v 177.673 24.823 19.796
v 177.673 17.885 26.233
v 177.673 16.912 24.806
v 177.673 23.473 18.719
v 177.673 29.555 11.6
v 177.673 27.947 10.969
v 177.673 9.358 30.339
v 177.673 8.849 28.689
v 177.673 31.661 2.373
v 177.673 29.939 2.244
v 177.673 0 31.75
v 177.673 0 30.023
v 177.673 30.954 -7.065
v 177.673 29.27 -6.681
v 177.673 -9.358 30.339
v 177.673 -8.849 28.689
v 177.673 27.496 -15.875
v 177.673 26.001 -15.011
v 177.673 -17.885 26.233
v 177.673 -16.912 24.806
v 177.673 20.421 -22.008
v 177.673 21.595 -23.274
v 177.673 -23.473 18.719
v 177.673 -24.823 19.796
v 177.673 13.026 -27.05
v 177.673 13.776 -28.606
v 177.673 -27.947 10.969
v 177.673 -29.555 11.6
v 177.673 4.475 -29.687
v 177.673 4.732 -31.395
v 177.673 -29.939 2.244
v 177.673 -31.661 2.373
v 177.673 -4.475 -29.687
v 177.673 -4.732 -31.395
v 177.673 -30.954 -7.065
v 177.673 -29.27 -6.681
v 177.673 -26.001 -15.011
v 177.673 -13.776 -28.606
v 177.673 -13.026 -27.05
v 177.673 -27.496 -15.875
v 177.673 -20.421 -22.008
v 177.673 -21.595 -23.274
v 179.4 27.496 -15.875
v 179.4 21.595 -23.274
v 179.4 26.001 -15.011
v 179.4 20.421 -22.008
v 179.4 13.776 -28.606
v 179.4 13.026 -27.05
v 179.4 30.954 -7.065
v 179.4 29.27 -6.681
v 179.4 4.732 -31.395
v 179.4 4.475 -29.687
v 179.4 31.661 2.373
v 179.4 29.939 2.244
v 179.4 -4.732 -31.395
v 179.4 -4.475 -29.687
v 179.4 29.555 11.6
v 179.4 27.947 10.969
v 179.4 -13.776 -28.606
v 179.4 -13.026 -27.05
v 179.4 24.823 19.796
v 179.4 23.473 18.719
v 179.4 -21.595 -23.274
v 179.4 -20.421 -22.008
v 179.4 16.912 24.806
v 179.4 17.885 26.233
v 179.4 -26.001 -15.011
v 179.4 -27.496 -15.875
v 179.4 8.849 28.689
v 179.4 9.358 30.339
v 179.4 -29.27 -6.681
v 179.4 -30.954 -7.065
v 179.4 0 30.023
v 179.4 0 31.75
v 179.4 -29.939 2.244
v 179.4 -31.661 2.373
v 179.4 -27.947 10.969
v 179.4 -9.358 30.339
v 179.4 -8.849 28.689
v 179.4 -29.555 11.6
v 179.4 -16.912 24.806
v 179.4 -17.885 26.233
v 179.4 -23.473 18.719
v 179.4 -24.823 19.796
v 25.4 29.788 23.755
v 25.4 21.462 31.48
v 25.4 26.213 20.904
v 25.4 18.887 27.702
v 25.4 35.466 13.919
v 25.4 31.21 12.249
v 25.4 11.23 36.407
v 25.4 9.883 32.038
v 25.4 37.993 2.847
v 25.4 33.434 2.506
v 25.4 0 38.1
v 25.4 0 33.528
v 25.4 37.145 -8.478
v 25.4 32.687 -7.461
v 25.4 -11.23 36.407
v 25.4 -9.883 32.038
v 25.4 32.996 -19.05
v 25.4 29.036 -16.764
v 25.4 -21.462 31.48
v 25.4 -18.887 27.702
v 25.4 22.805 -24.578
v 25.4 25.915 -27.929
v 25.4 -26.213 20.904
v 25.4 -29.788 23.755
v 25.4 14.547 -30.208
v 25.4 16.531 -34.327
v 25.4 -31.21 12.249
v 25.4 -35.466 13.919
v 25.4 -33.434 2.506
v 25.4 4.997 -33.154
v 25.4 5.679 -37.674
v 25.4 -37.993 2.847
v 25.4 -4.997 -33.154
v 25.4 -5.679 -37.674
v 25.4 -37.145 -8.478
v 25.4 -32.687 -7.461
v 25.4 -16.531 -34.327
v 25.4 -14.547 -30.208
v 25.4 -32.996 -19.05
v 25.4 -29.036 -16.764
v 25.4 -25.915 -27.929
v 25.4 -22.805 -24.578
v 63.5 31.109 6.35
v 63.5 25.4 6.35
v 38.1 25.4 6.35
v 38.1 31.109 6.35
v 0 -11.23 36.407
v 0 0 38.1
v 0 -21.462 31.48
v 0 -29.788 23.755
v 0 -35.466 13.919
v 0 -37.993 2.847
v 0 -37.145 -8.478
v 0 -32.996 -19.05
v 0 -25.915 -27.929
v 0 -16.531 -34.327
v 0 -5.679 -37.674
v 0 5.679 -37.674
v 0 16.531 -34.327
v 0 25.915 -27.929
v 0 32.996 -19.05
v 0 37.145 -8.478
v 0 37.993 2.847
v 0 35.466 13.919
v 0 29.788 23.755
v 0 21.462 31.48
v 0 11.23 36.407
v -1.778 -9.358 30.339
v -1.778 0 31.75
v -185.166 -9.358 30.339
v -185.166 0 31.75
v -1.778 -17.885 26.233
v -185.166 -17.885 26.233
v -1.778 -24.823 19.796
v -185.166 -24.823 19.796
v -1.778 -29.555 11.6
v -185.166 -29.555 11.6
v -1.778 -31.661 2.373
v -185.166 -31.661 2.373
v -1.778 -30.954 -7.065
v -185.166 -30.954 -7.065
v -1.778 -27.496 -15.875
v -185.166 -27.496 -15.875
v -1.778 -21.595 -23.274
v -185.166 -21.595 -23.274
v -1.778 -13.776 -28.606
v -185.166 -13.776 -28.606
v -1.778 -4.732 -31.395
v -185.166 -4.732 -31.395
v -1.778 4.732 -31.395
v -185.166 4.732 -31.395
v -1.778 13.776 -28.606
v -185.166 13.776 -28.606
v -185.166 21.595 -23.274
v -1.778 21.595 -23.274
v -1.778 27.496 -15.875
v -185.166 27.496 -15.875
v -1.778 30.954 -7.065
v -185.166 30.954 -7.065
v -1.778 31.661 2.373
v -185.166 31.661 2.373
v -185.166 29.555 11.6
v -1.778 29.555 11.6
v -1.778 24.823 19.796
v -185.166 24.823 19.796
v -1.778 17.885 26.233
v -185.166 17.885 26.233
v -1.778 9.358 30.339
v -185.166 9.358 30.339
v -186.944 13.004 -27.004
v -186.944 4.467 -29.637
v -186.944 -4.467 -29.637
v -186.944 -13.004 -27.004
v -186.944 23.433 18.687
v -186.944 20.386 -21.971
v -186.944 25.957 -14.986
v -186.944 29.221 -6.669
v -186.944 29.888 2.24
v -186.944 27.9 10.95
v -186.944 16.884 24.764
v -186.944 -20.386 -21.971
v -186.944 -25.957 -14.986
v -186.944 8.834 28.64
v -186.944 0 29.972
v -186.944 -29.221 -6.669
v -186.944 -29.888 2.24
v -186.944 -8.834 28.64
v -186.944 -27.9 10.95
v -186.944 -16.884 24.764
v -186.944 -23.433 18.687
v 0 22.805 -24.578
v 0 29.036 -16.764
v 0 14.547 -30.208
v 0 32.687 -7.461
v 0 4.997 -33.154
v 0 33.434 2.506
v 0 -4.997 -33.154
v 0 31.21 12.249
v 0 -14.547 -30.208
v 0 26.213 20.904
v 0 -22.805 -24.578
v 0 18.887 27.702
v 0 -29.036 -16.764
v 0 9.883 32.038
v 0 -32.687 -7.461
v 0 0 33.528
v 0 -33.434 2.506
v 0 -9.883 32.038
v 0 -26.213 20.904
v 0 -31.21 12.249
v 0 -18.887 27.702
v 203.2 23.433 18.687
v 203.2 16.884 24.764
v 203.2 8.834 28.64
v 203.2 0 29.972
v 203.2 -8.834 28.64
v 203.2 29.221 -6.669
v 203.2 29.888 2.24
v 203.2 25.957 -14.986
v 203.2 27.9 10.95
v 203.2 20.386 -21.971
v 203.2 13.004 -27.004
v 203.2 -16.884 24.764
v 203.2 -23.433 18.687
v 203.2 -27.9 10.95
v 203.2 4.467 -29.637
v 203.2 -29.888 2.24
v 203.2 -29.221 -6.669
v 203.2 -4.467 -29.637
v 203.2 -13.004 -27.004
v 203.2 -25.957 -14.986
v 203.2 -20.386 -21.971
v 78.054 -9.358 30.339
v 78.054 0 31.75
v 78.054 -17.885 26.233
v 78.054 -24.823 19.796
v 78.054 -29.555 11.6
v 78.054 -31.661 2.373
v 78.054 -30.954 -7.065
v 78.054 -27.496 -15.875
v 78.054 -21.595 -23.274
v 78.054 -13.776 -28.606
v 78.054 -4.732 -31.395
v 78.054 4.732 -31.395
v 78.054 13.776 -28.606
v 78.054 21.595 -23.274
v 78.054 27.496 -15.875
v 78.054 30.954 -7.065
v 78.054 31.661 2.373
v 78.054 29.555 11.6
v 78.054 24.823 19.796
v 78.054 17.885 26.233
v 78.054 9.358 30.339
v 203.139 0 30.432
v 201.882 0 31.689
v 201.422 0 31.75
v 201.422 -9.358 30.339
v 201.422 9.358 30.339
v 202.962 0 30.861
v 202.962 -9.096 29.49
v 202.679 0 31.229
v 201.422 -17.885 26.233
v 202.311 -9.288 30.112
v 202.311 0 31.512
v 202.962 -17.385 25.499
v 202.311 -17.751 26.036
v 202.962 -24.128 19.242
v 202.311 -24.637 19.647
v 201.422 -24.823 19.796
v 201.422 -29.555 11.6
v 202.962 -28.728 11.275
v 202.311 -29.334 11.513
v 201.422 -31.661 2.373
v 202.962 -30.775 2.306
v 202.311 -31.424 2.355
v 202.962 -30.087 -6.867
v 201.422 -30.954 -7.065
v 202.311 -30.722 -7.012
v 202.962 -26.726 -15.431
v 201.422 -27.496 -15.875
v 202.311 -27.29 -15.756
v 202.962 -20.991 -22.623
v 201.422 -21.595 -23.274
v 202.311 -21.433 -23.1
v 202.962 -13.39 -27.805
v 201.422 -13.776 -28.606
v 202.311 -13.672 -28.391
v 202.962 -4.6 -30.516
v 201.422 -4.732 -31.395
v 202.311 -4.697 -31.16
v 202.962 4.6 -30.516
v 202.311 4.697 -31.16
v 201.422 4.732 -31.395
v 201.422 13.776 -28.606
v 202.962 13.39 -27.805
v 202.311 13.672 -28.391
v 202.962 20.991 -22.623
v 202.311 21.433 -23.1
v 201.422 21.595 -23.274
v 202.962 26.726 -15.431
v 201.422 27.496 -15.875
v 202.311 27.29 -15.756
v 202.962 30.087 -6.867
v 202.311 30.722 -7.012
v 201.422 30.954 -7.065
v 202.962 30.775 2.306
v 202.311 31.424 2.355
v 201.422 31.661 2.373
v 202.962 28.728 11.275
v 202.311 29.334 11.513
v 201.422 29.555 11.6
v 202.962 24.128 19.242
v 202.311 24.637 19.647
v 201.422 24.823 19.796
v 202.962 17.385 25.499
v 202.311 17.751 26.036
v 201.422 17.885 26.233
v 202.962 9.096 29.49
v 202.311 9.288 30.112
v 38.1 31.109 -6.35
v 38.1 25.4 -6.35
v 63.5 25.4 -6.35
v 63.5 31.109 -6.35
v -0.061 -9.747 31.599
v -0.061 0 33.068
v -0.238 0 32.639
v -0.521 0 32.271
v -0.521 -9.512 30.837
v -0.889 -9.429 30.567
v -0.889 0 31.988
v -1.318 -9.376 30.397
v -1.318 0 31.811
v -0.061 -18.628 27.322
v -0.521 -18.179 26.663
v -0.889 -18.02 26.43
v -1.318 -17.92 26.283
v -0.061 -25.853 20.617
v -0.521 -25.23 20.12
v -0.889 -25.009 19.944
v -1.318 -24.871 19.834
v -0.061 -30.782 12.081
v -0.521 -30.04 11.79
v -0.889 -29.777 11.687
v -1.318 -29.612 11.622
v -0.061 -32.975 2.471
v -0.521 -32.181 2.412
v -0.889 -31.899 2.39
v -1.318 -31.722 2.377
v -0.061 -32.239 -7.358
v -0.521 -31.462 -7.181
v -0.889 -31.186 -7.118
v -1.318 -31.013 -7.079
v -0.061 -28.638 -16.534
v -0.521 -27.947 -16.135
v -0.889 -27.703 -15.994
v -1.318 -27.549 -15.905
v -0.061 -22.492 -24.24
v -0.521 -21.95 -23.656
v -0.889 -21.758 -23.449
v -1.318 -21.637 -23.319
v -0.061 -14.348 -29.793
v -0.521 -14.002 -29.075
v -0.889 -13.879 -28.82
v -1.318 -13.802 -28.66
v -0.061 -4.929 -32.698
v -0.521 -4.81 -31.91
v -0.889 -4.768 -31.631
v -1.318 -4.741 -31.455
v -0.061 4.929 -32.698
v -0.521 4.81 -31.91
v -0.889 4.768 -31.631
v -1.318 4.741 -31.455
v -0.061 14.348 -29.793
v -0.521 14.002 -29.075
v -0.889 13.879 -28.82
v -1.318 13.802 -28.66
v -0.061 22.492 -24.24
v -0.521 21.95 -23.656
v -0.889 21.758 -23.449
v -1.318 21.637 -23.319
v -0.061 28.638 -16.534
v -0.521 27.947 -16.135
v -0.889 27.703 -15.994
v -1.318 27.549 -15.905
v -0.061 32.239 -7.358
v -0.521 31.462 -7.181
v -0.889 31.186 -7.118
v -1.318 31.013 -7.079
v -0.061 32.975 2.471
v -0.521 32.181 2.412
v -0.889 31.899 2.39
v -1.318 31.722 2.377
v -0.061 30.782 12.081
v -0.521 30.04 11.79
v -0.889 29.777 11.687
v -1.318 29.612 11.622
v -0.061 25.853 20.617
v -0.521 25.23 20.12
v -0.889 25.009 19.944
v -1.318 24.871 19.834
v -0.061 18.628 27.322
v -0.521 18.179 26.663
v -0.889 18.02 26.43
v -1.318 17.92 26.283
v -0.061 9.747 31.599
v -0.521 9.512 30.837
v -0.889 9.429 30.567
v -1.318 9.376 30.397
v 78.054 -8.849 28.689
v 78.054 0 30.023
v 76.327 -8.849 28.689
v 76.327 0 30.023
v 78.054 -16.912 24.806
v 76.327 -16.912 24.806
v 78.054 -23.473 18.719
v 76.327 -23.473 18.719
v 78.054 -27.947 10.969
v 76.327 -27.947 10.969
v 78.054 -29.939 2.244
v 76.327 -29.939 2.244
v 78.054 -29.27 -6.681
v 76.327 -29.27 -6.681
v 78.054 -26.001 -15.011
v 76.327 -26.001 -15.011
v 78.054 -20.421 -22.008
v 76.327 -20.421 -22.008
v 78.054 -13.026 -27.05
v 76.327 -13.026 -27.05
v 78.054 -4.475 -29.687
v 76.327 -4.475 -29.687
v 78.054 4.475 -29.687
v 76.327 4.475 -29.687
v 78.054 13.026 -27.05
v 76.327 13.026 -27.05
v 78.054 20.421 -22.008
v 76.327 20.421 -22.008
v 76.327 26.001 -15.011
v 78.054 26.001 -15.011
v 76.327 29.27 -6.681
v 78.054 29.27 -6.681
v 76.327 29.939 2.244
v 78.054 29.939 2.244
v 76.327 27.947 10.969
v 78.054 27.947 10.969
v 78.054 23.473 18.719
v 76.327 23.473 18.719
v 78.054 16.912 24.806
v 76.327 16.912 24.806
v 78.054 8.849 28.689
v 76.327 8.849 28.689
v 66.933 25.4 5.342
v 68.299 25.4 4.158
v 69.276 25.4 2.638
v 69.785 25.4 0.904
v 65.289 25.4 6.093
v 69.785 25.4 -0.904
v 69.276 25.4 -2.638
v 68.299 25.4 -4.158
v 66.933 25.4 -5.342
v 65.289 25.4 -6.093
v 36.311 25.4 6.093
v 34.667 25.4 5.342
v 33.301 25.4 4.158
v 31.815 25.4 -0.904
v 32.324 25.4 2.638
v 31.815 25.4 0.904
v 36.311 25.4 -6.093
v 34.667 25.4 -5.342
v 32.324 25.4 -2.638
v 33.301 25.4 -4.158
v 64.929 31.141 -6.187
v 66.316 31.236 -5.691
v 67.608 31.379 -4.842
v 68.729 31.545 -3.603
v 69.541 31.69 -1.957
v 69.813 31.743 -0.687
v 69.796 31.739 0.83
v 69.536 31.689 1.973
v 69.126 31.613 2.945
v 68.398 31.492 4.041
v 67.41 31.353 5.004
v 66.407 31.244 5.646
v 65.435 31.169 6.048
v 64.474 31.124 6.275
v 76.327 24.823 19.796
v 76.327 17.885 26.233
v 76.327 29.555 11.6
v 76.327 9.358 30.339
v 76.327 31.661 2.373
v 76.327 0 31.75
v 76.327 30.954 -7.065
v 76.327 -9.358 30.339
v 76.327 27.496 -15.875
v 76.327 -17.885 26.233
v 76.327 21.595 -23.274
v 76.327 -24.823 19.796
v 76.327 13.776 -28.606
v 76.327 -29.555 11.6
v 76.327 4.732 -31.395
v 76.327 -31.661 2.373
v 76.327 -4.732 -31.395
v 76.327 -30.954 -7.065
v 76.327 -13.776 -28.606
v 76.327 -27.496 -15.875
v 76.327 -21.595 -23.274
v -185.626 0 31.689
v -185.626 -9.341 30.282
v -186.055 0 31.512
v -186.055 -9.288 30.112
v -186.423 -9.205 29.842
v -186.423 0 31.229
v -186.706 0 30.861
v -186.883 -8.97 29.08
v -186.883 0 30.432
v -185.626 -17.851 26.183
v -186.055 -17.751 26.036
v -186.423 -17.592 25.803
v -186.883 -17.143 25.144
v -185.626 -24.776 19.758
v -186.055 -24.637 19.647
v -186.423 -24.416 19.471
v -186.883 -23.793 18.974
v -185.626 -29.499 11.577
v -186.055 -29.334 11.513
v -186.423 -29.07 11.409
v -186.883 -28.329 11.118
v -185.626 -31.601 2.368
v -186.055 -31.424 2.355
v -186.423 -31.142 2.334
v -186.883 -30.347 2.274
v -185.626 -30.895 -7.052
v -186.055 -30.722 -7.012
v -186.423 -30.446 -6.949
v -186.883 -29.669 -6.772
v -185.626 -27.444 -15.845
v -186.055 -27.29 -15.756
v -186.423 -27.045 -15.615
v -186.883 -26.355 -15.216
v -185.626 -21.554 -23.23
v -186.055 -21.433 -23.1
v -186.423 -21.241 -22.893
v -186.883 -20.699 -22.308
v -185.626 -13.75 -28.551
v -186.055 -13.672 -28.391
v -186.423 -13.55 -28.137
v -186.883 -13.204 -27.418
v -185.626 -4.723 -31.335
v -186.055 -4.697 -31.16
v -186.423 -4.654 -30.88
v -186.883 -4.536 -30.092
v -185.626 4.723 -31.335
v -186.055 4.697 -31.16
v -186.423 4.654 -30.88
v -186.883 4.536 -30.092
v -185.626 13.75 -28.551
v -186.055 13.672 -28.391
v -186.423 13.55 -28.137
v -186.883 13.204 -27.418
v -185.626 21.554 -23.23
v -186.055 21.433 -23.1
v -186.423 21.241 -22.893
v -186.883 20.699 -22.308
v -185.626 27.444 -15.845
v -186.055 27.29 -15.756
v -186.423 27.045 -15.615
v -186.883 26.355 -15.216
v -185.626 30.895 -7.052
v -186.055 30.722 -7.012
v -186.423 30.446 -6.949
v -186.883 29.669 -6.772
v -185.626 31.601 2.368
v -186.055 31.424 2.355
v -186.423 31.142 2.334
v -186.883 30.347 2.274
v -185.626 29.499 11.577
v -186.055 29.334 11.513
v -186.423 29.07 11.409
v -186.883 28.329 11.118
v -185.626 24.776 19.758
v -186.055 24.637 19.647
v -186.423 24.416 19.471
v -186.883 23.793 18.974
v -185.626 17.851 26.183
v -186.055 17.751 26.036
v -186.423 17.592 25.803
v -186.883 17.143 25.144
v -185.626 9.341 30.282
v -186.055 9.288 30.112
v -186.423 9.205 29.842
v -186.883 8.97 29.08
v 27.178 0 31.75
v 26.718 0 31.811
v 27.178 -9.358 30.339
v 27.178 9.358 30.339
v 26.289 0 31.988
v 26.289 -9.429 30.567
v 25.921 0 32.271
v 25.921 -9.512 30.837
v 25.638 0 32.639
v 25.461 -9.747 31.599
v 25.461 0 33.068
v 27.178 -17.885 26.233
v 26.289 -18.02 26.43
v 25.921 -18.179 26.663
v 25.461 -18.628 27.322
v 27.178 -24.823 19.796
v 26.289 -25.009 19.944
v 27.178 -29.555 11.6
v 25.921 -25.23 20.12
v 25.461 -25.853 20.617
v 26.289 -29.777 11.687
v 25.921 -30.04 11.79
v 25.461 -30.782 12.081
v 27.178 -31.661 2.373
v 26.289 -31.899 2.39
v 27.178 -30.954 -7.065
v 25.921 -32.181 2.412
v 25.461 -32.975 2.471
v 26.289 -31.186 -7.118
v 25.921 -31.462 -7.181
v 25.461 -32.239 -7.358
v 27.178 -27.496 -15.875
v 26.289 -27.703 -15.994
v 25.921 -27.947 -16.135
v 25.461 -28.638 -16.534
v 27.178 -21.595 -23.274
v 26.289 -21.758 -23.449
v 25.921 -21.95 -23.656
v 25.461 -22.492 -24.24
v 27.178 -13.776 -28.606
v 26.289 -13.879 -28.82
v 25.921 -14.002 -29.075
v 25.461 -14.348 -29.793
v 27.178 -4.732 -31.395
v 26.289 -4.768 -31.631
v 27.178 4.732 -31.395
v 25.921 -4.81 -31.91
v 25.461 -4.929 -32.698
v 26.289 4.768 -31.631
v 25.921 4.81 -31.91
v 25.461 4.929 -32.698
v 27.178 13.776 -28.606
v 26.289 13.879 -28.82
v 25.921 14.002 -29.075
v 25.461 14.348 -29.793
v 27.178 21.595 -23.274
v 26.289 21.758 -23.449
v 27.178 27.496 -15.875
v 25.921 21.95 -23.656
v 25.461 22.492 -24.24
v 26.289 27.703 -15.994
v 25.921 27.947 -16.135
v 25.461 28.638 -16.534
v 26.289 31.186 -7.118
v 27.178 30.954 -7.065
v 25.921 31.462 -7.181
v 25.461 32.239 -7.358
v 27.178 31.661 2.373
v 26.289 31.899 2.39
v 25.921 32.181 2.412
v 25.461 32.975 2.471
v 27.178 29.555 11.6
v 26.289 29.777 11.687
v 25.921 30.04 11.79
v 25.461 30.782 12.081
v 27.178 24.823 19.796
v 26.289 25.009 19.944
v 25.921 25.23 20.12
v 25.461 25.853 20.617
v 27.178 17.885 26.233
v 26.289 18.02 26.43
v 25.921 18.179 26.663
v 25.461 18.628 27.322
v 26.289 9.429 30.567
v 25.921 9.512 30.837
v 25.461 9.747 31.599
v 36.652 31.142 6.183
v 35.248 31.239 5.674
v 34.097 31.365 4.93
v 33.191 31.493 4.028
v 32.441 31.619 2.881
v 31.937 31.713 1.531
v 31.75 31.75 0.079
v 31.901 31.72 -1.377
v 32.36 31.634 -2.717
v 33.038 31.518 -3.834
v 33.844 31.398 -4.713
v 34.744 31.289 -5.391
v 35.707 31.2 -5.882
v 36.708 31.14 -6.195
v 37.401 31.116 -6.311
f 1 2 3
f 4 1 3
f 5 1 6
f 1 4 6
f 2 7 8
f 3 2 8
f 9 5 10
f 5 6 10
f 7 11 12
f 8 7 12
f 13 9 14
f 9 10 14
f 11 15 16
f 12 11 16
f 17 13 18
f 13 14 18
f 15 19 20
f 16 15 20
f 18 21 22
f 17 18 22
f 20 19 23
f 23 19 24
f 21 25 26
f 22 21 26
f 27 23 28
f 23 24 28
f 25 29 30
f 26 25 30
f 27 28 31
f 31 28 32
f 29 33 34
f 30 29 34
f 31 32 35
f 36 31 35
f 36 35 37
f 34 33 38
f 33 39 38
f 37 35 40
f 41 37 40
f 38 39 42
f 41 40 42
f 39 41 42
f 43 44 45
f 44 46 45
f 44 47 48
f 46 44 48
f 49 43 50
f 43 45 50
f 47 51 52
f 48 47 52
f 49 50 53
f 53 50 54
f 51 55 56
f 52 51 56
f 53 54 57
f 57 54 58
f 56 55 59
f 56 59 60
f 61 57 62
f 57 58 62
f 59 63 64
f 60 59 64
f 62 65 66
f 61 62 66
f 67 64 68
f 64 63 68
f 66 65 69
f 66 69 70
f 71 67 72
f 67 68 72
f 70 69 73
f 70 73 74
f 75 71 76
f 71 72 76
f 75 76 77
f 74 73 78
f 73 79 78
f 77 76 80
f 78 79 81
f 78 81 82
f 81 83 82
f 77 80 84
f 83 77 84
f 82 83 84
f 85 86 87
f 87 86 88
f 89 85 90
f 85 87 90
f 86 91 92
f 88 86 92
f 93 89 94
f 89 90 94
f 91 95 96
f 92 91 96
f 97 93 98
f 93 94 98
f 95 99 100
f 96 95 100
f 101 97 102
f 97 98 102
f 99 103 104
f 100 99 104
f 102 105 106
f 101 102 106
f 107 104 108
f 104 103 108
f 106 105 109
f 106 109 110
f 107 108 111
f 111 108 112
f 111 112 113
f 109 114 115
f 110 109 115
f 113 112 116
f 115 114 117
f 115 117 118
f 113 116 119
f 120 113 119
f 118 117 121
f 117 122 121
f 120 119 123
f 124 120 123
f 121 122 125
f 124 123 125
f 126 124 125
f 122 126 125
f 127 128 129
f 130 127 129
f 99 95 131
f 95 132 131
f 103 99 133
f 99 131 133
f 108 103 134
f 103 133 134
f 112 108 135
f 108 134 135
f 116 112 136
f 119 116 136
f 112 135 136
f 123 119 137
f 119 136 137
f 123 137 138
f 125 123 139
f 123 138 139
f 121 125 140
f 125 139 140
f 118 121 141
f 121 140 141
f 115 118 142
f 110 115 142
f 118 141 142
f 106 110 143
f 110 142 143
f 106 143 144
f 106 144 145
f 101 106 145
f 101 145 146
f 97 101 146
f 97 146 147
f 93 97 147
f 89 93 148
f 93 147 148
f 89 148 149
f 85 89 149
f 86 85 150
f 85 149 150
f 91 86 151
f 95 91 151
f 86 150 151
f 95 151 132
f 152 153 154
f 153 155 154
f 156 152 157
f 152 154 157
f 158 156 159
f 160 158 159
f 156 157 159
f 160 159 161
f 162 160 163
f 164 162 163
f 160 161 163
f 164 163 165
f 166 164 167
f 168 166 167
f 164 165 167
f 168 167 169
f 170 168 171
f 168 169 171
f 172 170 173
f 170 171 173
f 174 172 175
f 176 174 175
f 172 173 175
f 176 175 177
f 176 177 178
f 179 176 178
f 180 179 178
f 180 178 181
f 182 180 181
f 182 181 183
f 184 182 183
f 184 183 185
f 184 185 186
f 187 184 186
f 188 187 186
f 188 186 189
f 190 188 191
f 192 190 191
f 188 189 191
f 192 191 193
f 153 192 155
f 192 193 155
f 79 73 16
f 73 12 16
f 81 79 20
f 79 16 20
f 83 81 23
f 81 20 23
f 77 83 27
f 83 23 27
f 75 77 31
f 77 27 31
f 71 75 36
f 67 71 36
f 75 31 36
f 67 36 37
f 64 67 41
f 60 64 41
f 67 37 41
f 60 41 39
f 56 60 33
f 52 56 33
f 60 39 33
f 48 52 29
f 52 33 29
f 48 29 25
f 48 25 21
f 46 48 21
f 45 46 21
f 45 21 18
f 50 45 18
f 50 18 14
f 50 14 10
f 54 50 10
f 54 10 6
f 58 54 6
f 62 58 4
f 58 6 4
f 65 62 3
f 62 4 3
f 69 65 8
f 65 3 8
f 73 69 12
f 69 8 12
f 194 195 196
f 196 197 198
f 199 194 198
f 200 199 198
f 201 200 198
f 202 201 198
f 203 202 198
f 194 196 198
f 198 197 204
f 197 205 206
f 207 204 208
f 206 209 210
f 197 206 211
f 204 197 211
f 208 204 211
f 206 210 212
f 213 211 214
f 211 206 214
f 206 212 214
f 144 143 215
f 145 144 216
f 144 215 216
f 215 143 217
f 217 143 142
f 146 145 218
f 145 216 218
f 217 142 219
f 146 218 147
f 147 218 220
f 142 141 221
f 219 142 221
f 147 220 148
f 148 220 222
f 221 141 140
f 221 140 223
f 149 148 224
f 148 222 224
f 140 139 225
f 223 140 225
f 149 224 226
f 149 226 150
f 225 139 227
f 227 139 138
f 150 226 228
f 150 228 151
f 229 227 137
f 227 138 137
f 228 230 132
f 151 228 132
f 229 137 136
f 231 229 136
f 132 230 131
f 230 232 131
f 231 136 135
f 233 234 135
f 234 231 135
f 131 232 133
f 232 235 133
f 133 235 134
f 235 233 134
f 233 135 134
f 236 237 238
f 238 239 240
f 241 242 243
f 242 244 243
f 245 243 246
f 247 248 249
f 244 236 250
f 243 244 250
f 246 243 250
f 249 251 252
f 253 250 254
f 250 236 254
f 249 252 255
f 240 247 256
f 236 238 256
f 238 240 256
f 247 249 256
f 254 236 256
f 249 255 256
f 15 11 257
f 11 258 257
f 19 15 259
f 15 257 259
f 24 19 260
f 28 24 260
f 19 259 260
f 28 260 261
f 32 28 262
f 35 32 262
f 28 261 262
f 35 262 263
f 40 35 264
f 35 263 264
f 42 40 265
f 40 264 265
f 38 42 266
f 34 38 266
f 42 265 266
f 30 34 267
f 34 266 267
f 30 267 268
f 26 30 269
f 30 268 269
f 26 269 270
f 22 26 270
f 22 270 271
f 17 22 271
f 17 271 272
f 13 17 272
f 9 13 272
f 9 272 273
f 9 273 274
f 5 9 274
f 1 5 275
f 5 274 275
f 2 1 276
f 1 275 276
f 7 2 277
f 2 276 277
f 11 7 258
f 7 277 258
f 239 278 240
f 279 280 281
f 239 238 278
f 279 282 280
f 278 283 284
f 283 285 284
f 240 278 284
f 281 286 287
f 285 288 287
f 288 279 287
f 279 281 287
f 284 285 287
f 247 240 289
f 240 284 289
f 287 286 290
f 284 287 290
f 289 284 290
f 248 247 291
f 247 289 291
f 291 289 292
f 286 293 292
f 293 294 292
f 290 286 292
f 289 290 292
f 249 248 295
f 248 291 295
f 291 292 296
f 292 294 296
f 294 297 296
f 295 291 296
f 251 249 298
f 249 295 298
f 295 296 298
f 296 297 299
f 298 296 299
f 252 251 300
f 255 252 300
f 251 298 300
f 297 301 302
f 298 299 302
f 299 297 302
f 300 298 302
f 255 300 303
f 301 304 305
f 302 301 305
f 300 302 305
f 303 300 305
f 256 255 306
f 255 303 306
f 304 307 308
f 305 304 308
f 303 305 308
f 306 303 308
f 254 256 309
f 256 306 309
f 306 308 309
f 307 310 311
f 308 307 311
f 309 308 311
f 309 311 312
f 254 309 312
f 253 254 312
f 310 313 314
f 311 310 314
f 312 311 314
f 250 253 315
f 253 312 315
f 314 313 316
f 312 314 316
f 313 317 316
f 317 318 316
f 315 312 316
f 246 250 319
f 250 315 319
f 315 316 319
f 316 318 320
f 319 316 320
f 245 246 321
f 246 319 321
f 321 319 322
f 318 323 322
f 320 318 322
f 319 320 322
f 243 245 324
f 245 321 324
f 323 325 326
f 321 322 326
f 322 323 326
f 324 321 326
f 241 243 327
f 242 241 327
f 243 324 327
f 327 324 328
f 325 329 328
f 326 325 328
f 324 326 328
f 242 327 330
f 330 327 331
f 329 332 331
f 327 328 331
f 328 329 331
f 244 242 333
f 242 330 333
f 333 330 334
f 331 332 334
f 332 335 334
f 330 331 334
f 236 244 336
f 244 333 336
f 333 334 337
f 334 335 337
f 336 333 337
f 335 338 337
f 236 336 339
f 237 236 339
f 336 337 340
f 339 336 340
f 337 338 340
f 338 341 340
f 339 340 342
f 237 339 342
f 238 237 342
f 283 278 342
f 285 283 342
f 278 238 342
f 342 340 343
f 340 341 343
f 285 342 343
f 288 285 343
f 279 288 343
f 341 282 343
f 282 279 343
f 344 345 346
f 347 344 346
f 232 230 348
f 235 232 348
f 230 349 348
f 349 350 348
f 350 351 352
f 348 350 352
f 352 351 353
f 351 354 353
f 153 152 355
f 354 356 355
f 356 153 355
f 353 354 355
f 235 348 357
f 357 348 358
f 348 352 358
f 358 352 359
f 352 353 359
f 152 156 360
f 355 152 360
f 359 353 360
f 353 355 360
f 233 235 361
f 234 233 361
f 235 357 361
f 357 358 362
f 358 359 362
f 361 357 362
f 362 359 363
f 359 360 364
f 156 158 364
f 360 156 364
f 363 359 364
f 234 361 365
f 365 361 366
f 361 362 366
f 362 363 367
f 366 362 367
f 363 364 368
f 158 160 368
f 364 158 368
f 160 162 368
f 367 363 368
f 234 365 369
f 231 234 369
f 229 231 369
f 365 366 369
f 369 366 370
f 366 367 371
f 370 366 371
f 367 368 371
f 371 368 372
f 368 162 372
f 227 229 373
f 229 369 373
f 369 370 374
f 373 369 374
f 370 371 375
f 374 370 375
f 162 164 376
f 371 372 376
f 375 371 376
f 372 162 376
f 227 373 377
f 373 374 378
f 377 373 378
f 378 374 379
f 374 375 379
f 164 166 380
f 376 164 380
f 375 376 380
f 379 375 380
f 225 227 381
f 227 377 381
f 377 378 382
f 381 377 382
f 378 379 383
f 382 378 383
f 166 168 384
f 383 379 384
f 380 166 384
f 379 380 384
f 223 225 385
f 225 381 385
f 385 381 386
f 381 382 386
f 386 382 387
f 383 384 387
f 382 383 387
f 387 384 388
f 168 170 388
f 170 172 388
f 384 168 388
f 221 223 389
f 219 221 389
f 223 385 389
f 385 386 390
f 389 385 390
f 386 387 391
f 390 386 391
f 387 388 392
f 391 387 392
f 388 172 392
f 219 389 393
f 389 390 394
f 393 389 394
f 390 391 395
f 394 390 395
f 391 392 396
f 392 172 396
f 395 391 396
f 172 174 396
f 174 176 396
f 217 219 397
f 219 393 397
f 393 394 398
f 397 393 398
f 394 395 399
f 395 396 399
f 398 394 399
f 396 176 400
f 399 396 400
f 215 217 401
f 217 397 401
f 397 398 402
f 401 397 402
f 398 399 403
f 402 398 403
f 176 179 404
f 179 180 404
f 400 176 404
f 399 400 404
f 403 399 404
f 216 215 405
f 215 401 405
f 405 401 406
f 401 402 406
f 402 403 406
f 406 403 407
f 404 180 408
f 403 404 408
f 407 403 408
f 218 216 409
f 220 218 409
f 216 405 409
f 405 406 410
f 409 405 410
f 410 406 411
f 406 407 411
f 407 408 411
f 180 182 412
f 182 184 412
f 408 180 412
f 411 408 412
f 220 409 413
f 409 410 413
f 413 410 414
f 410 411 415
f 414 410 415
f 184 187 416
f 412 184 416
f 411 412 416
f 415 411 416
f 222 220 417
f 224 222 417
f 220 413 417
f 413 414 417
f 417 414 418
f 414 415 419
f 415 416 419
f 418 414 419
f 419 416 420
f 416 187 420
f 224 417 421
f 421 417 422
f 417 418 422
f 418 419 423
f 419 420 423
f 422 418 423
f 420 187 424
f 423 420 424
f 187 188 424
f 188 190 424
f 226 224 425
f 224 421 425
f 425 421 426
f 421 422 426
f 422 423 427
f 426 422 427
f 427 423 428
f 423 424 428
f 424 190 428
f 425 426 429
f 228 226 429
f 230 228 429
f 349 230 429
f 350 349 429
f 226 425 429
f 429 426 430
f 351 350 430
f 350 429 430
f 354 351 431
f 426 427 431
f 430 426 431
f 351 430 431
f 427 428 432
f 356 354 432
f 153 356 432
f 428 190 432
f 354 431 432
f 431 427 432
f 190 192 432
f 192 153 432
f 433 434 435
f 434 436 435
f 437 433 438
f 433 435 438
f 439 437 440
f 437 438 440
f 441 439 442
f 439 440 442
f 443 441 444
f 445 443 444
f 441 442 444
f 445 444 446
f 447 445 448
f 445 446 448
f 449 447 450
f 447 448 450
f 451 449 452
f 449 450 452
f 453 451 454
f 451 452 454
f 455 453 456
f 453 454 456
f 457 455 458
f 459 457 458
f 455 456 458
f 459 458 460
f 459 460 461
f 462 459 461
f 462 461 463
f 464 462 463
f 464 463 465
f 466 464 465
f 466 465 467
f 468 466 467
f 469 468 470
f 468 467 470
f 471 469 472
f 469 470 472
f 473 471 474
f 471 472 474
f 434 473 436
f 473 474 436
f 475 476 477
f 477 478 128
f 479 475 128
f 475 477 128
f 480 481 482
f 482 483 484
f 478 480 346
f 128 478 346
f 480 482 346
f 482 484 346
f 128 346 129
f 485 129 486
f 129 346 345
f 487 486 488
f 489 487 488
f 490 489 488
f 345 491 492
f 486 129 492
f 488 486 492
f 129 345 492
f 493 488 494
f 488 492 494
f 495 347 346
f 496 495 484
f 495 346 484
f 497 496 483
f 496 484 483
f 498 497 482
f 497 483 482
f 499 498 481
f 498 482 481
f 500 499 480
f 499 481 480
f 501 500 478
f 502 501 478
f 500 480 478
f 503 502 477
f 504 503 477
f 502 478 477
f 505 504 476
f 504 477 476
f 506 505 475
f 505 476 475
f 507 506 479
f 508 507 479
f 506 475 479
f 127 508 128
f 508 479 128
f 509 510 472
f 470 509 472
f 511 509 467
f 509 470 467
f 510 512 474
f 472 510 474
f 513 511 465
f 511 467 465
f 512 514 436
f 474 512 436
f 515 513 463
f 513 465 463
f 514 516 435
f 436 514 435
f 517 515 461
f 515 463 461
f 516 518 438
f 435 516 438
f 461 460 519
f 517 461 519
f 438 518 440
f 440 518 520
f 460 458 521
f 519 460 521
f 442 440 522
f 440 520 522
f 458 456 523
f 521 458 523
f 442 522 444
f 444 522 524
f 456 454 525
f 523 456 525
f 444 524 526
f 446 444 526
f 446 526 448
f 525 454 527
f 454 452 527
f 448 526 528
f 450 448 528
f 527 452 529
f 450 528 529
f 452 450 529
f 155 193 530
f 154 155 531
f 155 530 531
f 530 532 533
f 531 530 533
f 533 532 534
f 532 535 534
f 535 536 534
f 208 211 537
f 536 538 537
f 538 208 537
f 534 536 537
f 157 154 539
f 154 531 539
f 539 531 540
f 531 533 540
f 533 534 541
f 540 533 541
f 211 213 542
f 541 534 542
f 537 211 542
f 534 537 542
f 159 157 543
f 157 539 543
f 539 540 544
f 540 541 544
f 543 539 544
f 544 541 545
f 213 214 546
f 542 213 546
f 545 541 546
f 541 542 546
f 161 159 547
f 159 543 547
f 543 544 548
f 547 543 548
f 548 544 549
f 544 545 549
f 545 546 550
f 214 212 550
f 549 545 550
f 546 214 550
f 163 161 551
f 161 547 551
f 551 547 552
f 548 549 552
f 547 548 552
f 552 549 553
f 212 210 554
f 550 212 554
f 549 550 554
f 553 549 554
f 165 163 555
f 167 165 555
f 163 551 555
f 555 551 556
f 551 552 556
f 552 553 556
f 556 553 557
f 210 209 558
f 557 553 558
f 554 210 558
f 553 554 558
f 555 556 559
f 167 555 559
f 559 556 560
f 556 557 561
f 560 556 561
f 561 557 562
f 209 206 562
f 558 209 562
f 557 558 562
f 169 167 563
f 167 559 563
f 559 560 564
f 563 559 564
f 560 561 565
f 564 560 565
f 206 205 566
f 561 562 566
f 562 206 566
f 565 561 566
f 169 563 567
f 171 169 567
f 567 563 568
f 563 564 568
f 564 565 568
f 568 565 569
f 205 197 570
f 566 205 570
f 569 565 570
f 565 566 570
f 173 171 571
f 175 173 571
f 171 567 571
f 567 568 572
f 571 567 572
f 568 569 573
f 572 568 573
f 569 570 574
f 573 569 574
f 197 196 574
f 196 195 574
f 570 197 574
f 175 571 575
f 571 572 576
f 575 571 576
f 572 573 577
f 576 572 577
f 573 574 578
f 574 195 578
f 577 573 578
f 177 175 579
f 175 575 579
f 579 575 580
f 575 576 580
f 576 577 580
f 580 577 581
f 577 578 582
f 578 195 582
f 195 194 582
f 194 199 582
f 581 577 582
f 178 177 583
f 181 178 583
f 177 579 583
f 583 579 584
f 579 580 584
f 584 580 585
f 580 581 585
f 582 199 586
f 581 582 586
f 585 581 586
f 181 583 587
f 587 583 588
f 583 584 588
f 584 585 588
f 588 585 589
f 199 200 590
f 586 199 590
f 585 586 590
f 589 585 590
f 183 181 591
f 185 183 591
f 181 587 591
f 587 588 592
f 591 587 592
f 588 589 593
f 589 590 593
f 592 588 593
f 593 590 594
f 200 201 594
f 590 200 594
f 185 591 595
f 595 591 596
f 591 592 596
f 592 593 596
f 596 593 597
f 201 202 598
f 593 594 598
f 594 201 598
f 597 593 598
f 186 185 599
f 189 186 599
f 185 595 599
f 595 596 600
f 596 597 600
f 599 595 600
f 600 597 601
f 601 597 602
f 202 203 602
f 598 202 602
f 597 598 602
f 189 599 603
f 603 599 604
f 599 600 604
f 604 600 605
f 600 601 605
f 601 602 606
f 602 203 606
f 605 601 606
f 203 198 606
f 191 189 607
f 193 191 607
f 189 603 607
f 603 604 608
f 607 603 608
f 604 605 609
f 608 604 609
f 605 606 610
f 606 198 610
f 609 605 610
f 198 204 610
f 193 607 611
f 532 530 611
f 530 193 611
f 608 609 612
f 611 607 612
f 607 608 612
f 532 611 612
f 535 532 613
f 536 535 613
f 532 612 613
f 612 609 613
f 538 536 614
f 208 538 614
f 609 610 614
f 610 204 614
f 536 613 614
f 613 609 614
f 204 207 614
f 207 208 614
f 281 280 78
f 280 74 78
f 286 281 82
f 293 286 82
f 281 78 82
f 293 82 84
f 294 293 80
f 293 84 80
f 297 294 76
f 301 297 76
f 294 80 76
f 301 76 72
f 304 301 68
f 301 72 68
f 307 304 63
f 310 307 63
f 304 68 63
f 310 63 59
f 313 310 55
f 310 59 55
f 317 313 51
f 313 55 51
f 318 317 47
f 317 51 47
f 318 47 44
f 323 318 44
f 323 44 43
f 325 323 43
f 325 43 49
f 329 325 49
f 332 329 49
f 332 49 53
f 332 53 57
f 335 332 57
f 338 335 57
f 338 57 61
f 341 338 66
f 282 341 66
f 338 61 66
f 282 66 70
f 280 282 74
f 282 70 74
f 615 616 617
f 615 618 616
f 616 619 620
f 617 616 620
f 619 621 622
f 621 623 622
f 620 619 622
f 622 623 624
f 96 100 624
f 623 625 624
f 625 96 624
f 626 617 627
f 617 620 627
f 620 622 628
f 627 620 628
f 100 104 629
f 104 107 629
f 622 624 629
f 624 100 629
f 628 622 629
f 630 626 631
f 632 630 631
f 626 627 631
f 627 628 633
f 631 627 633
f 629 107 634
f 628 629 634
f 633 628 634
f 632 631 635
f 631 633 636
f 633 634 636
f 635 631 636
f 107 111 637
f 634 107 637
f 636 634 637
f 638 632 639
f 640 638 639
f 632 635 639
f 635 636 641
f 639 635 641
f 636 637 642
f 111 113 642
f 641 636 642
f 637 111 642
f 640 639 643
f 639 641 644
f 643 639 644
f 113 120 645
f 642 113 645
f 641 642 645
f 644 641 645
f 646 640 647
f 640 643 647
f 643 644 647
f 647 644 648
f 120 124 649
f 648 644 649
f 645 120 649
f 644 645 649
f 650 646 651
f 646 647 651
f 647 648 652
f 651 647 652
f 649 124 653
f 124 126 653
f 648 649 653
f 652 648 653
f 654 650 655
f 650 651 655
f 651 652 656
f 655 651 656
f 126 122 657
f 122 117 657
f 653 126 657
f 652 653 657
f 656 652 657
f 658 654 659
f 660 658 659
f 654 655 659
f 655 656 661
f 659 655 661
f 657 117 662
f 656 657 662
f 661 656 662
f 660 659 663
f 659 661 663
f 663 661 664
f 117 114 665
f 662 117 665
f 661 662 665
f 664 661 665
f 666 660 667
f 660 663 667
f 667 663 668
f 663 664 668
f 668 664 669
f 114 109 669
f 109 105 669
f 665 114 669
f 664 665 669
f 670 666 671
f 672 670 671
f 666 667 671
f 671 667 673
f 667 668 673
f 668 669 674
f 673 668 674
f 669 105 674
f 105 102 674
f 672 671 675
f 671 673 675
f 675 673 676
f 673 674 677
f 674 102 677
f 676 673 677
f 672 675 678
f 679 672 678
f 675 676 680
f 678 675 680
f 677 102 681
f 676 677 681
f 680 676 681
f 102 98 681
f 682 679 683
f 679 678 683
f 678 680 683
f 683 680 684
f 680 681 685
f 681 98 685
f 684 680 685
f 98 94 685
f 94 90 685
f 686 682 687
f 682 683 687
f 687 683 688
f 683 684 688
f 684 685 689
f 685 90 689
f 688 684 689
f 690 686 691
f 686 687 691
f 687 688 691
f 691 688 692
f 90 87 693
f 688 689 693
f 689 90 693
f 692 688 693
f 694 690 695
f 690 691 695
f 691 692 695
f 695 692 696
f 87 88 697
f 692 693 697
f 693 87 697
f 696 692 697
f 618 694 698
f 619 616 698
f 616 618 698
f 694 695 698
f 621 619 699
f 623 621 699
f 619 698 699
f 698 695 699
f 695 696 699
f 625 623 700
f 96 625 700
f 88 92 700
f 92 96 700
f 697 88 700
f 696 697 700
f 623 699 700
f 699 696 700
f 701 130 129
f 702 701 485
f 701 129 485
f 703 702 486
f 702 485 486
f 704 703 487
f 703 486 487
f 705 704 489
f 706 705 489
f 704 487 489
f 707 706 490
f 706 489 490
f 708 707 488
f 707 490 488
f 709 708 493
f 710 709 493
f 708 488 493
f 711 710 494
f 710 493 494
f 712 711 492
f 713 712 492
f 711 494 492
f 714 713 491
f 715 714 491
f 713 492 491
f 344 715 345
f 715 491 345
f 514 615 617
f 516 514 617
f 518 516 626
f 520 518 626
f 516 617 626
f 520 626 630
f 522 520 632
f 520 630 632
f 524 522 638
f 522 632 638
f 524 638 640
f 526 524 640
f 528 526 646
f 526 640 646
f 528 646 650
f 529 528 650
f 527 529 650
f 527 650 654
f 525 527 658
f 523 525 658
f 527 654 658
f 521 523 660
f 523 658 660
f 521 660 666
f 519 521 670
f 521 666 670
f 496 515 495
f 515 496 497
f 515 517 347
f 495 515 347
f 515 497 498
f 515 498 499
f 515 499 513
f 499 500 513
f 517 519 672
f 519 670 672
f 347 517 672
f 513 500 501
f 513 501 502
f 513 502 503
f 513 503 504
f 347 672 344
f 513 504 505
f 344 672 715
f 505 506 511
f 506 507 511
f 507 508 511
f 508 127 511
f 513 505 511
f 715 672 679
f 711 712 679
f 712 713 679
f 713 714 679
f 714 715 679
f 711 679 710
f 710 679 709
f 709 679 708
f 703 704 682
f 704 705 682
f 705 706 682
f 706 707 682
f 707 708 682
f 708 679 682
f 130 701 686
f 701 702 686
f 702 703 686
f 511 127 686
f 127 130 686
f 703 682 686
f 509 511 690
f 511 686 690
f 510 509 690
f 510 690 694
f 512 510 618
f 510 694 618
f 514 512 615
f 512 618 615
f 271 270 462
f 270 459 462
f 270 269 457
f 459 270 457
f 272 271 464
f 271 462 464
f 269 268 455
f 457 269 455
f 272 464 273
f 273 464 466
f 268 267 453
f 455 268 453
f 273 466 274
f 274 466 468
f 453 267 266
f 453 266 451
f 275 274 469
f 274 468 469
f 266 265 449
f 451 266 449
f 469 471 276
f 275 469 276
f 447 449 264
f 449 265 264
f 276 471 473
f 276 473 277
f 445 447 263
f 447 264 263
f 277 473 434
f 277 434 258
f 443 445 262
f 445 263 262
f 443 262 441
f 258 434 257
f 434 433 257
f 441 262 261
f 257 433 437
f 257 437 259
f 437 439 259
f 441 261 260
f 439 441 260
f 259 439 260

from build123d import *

# Parameters (mm, degrees)
CUT_EXTRUDE1_START = 25.4
CUT_EXTRUDE1_DEPTH = 185.822406037


with BuildPart() as part:
    # Sketch1 → Revolve1 (revolve)
    with BuildSketch(Plane(origin=(0, 0, 0), x_dir=(1, 0, 0), z_dir=(0, 1, 0))):
        with BuildLine():
            Line((-186.944, 0), (0, 0))
            Line((0, 0), (203.2, 0))
            Line((203.2, 0), (203.2, 29.972))
            ThreePointArc((203.2, 29.972), (202.679235857, 31.229235857), (201.422, 31.75))
            Line((201.422, 31.75), (179.4002, 31.75))
            Line((179.4002, 31.75), (179.4002, 30.0228))
            Line((179.4002, 30.0228), (177.673, 30.0228))
            Line((177.673, 30.0228), (177.673, 31.75))
            Line((177.673, 31.75), (78.0542, 31.75))
            Line((78.0542, 31.75), (78.0542, 30.0228))
            Line((78.0542, 30.0228), (76.327, 30.0228))
            Line((76.327, 30.0228), (76.327, 31.75))
            Line((76.327, 31.75), (27.178, 31.75))
            ThreePointArc((27.178, 31.75), (25.920764143, 32.270764143), (25.4, 33.528))
            Line((25.4, 33.528), (25.4, 38.1))
            Line((25.4, 38.1), (0, 38.1))
            Line((0, 38.1), (0, 33.528))
            ThreePointArc((0, 33.528), (-0.520764143, 32.270764143), (-1.778, 31.75))
            Line((-1.778, 31.75), (-185.166, 31.75))
            ThreePointArc((-185.166, 31.75), (-186.423235857, 31.229235857), (-186.944, 29.972))
            Line((-186.944, 29.972), (-186.944, 0))
        make_face()
    revolve(axis=Axis((0, 0, 0), (1, 0, 0)))

    # Sketch1<4> → Cut-Extrude1 (cut, through all)
    with BuildSketch(Plane(origin=(0, 0, 0), x_dir=(1, 0, 0), z_dir=(0, 1, 0)).offset(CUT_EXTRUDE1_START)):
        with BuildLine():
            Line((38.1, 6.35), (63.5, 6.35))
            ThreePointArc((63.5, 6.35), (69.85, 0), (63.5, -6.35))
            Line((63.5, -6.35), (38.1, -6.35))
            ThreePointArc((38.1, -6.35), (31.75, 0), (38.1, 6.35))
        make_face()
    extrude(amount=CUT_EXTRUDE1_DEPTH, mode=Mode.SUBTRACT)


solid = part.part
